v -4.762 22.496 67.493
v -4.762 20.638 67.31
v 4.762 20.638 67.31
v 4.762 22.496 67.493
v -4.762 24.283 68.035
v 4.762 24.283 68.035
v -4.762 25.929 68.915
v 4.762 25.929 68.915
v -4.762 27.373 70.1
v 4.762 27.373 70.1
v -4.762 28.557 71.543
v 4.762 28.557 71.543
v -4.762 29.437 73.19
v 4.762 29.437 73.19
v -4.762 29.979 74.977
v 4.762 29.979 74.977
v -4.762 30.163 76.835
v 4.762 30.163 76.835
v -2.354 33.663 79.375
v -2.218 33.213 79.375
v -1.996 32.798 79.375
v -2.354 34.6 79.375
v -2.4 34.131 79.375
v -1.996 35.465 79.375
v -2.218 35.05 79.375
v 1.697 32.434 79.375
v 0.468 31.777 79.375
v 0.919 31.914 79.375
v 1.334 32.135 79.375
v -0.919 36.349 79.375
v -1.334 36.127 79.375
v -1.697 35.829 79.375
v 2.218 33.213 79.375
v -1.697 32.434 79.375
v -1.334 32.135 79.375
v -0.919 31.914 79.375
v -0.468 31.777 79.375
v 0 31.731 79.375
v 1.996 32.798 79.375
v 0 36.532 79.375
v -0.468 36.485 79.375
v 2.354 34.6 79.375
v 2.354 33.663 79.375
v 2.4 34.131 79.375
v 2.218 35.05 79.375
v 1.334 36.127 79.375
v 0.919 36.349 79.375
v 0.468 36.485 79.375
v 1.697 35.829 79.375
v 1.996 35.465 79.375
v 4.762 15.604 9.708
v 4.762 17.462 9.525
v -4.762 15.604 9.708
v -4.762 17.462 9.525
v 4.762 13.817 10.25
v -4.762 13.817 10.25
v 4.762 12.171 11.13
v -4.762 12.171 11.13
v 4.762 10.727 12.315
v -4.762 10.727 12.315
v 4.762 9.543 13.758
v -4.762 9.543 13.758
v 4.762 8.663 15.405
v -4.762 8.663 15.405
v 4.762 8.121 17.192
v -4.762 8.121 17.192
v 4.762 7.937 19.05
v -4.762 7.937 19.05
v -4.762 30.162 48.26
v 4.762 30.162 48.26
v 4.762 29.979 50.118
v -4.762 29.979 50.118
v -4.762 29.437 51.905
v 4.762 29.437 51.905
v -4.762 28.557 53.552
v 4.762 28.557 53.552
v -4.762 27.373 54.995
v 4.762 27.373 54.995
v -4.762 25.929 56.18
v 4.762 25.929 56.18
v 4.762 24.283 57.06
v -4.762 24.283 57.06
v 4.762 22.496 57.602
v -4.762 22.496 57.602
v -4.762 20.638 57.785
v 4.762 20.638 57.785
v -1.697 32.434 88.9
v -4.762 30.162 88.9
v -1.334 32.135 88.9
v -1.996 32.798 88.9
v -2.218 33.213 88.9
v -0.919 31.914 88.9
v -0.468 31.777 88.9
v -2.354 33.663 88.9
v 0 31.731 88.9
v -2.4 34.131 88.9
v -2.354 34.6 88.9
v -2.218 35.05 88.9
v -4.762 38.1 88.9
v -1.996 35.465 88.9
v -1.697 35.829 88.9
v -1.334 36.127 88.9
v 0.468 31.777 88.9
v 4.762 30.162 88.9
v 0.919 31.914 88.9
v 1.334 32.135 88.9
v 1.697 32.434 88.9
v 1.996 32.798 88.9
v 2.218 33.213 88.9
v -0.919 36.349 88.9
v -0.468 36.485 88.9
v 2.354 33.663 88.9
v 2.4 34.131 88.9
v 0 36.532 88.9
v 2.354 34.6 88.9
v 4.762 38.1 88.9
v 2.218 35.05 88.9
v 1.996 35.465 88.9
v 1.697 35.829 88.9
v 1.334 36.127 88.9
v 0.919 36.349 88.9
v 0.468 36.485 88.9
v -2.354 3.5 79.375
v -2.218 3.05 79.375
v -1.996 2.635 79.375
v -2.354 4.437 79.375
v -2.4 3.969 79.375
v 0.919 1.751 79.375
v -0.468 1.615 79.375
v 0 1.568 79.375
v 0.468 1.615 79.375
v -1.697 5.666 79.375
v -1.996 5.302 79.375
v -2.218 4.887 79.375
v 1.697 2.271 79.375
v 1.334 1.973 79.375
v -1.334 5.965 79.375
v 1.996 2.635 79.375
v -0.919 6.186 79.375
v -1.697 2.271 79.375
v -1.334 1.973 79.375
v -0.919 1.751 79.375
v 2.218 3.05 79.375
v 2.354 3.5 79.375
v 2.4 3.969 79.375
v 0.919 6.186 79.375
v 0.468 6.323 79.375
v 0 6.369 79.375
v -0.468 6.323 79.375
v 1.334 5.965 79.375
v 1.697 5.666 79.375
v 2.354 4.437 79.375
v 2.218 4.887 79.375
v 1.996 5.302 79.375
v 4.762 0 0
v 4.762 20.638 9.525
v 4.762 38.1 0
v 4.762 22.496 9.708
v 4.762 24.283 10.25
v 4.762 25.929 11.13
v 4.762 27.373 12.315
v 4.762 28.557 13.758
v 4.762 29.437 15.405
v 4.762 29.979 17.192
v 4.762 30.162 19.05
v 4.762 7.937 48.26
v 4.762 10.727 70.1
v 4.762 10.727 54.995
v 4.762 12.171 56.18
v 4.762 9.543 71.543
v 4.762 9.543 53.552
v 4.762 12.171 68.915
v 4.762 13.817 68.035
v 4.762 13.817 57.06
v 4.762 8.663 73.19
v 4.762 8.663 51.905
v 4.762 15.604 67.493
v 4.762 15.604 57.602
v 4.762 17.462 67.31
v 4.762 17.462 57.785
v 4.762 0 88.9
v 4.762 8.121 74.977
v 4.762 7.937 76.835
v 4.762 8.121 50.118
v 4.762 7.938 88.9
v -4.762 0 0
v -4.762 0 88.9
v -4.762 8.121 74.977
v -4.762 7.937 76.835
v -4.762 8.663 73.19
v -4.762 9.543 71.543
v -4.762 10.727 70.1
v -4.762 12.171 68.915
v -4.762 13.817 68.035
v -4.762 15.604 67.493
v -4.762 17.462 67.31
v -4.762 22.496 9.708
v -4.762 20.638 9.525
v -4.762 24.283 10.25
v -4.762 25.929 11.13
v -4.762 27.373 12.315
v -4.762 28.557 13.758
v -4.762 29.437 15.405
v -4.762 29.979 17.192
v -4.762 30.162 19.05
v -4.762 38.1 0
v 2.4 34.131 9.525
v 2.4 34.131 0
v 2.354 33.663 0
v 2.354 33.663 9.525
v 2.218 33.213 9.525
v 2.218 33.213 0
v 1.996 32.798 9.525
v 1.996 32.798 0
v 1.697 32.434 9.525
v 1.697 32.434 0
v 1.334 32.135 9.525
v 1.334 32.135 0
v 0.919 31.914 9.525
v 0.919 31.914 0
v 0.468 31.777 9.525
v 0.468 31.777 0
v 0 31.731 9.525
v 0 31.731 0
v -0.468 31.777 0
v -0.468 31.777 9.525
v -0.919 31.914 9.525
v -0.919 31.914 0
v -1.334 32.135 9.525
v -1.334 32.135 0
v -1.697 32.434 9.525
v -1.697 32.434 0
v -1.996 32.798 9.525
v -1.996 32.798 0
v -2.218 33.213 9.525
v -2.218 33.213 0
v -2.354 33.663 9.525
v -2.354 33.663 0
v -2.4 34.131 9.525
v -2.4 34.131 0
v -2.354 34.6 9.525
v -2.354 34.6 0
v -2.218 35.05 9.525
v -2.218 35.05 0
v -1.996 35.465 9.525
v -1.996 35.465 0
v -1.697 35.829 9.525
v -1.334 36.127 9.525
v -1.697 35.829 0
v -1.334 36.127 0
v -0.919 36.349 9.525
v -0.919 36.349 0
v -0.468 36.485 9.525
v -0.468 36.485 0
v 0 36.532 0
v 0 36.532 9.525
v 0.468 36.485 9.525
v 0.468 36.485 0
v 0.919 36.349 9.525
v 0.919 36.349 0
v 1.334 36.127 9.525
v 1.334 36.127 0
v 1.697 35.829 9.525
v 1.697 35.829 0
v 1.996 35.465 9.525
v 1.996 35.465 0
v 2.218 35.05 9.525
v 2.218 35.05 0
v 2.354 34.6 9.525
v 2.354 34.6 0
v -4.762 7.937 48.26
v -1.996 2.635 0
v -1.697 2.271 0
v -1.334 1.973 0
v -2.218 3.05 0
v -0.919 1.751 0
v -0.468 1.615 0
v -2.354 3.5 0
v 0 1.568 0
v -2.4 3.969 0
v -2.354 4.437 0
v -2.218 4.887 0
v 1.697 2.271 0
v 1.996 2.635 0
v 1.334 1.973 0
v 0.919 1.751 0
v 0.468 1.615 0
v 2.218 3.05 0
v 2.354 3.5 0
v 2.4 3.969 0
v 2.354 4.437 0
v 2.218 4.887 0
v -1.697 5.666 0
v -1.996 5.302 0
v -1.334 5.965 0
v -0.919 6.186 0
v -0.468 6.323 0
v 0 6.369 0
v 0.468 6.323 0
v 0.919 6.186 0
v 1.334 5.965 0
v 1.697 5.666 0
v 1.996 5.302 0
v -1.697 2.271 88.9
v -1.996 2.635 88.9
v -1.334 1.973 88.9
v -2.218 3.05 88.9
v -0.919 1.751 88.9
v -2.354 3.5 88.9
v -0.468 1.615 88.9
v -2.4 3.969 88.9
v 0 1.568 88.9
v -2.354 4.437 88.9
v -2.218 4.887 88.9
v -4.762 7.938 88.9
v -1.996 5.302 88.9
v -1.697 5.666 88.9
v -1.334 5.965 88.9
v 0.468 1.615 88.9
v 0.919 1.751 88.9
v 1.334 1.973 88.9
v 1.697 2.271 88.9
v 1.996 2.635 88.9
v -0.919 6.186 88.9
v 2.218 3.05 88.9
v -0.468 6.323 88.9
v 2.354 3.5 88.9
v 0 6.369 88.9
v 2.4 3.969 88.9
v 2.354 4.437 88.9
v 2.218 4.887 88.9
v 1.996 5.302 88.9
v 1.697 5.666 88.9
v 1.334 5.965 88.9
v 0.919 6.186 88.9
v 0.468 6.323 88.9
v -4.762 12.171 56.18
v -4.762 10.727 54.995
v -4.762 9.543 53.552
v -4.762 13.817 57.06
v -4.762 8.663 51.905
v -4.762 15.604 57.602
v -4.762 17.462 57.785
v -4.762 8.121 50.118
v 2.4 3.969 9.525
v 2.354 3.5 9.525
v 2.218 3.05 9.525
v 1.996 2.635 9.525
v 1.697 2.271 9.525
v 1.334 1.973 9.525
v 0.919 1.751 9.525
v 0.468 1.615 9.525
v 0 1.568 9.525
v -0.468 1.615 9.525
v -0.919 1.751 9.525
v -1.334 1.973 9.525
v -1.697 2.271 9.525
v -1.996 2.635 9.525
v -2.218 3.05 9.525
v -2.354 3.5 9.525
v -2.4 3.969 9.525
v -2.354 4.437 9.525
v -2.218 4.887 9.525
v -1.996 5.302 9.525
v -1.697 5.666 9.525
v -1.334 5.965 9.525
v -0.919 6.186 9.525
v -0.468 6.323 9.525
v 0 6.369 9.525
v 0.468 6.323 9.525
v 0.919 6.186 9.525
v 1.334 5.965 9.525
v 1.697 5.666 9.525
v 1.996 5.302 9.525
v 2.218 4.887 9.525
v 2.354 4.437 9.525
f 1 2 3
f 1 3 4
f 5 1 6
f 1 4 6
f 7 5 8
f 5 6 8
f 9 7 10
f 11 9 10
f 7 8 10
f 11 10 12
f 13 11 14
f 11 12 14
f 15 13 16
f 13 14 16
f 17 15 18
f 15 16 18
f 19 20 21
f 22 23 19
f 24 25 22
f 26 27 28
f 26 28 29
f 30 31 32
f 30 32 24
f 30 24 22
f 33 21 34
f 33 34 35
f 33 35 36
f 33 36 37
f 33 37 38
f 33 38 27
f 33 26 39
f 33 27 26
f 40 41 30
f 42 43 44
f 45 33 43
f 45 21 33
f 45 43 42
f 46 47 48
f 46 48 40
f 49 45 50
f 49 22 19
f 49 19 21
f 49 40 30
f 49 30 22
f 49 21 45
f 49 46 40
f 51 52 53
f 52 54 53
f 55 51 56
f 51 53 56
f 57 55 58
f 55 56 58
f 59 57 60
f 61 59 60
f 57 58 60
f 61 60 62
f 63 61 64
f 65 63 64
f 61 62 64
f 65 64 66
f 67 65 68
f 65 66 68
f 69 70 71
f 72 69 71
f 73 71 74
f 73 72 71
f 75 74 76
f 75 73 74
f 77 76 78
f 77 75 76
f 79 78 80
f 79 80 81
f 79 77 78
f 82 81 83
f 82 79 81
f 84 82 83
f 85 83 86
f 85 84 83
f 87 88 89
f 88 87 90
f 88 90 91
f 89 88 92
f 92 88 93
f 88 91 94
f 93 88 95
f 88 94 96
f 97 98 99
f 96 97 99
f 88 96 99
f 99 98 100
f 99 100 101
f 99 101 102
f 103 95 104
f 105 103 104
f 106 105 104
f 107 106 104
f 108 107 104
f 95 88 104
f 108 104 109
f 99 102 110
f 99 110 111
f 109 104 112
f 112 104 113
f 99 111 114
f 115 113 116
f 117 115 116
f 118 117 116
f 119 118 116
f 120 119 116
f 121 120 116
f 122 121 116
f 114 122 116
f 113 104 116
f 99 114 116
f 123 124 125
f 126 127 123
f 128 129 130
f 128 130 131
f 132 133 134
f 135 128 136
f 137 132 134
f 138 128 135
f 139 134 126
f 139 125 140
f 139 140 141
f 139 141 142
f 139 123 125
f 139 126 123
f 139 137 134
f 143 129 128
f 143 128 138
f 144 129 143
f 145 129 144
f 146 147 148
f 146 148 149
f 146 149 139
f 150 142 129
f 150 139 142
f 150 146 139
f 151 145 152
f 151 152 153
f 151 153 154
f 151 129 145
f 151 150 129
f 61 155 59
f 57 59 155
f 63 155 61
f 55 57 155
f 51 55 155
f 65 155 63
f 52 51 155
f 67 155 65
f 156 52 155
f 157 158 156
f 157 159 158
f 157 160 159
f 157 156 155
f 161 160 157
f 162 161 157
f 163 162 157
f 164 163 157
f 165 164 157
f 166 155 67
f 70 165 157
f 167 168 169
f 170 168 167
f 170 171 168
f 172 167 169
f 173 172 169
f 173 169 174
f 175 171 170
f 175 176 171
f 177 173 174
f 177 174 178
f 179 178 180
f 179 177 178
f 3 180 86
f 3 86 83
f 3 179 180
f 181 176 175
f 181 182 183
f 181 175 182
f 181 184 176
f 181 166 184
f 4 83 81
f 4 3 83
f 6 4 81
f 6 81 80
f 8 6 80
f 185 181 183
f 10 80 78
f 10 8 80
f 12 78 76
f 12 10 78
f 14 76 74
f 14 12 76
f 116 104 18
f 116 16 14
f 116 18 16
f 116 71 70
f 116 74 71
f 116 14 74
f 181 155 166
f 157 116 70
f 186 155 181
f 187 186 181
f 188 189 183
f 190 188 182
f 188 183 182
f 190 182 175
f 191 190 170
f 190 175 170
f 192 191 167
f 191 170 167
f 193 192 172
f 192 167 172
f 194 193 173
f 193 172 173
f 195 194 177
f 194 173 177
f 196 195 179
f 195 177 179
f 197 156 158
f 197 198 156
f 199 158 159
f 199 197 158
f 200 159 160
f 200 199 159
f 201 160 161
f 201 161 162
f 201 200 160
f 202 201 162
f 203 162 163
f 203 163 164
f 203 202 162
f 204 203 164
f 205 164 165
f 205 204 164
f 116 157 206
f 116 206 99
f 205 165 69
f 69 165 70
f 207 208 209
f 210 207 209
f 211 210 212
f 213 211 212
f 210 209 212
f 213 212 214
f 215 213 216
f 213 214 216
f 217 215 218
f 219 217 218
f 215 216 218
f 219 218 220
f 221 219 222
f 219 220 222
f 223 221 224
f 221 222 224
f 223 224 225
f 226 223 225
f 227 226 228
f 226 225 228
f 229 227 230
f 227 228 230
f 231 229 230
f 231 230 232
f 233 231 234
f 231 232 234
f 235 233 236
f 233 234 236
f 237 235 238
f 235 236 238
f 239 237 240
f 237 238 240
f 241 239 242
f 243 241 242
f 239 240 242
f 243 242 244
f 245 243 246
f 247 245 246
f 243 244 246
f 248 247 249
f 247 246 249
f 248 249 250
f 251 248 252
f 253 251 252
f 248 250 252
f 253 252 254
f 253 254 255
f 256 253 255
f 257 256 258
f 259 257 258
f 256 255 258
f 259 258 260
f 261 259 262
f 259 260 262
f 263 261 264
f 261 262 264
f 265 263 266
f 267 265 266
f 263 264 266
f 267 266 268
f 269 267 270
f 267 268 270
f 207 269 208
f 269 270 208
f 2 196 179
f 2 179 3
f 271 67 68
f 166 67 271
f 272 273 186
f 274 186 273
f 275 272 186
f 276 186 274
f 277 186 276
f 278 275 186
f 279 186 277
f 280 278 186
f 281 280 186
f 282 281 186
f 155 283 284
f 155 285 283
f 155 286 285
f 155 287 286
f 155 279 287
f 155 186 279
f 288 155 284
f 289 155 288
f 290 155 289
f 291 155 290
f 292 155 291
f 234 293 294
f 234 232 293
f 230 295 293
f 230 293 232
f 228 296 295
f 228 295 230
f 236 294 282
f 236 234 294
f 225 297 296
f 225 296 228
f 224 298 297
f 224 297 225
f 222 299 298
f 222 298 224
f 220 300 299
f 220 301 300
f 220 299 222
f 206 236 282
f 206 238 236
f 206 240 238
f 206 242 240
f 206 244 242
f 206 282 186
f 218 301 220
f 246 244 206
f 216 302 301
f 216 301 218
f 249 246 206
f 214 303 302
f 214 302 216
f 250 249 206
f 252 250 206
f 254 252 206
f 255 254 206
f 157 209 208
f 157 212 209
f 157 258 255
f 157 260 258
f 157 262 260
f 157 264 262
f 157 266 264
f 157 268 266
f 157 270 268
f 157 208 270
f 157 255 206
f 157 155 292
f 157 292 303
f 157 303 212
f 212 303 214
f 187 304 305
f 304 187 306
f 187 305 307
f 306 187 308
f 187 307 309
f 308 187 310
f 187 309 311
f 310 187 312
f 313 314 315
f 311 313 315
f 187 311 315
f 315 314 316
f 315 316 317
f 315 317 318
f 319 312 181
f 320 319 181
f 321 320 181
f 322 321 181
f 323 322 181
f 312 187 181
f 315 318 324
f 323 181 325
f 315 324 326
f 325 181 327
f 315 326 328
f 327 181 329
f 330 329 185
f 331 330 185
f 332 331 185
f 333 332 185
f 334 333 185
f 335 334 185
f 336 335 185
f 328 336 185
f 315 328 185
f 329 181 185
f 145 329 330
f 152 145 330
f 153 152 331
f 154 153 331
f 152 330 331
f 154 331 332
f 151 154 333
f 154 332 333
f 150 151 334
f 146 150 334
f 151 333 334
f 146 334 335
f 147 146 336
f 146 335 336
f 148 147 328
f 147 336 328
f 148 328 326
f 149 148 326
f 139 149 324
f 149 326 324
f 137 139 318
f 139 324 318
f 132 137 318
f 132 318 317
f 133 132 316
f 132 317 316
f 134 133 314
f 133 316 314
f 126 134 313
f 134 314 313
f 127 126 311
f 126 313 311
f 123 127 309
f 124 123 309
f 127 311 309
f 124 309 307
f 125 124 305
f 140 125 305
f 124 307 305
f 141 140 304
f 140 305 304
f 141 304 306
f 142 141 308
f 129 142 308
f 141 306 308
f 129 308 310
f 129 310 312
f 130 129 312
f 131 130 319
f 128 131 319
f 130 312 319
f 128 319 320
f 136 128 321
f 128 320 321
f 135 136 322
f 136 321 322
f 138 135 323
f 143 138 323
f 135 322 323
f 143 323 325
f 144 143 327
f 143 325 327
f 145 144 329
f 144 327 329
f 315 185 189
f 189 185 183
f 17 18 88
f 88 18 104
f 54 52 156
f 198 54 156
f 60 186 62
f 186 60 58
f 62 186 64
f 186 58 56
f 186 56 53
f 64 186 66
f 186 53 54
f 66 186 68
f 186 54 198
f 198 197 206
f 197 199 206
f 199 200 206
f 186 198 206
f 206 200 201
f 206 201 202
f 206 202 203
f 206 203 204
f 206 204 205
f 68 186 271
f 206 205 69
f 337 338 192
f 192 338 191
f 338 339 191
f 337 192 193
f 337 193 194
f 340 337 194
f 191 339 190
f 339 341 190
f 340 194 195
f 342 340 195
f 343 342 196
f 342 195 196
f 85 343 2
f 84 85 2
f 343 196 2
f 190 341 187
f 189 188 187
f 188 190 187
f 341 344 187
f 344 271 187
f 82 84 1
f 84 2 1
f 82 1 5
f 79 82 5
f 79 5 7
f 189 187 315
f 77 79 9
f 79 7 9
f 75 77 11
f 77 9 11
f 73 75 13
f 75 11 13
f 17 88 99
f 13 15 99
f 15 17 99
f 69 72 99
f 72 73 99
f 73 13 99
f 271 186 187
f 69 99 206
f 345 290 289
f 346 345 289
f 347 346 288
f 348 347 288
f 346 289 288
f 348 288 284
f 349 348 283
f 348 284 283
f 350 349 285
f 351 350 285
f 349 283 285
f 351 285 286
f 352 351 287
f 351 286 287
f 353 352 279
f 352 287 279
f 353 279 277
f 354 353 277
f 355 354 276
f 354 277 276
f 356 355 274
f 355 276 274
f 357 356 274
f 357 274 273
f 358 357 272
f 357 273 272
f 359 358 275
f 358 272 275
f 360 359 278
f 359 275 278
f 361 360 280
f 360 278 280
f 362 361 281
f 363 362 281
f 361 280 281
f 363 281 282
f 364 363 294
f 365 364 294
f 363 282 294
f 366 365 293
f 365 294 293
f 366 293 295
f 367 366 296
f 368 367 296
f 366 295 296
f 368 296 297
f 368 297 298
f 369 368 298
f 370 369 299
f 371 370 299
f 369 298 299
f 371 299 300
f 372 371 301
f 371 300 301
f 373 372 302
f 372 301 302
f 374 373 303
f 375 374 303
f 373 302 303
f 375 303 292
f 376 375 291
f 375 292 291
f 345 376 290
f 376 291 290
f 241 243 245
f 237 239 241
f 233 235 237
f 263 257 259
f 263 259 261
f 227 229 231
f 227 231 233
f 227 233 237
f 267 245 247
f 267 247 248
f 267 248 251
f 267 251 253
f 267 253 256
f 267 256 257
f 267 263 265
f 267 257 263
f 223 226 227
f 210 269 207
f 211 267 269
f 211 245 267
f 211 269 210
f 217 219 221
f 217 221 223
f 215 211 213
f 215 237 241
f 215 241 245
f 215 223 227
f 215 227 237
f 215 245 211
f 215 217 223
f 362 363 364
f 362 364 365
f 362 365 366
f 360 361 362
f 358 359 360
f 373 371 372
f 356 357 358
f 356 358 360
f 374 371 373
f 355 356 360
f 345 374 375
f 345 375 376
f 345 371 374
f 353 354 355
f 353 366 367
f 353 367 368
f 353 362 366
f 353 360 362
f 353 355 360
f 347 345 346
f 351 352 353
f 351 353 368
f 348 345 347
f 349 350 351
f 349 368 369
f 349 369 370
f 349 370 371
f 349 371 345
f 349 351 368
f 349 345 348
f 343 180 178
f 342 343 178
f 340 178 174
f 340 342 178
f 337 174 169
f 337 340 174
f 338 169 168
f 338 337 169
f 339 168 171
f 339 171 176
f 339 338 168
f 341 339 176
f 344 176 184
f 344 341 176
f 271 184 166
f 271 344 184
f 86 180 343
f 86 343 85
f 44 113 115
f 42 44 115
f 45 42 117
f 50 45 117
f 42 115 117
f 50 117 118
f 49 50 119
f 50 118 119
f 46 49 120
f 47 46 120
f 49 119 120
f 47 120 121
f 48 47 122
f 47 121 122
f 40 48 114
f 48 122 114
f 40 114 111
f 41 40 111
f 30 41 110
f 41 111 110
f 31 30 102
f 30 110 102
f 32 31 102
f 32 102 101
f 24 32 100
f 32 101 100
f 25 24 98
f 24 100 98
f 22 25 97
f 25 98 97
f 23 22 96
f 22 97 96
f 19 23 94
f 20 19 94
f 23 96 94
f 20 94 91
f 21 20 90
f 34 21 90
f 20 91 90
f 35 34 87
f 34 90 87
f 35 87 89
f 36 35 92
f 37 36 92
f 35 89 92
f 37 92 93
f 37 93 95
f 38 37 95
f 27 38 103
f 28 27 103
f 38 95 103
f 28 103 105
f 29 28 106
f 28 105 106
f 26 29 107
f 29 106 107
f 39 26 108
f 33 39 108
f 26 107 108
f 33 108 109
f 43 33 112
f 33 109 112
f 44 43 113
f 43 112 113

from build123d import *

# Parameters (mm, degrees)
F0_W     = 38.1
F0_H     = 88.9
F1_DEPTH = 4.7625
F3_DEPTH = 12.7
F4_R     = 2.4003
F5_DEPTH = 9.525
F6_R     = 2.4003
F7_DEPTH = 9.525
F8_W     = 22.225
F8_H     = 48.26
F9_DEPTH = 9.526
F10_R    = 9.525


with BuildPart() as f1:
    # F0 (on Right) → F1 (new body, symmetric)
    with BuildSketch(Plane.YZ):
        with Locations((19.05, 44.45)):
            Rectangle(F0_W, F0_H)
    extrude(amount=F1_DEPTH, both=True)

    # F2 (on face) → F3 (cut, symmetric)
    with BuildSketch(Plane.YZ.offset(4.7625)):
        with BuildLine():
            Line((30.1625, 88.9), (7.9375, 88.9))
            Line((7.9375, 88.9), (7.9375, 76.835))
            ThreePointArc((7.9375, 76.835), (10.7273079092, 70.0998079092), (17.4625, 67.31))
            Line((17.4625, 67.31), (20.6375, 67.31))
            ThreePointArc((20.6375, 67.31), (27.3726920908, 70.0998079092), (30.1625, 76.835))
            Line((30.1625, 76.835), (30.1625, 88.9))
        make_face()
    extrude(amount=F3_DEPTH, both=True, mode=Mode.SUBTRACT)

    # F4 (on face) → F5 (cut)
    with BuildSketch(Plane.XY.offset(88.9)):
        with Locations((0, 3.96875)):
            Circle(F4_R)
        with Locations((0, 34.13125)):
            Circle(F4_R)
    extrude(amount=-F5_DEPTH, mode=Mode.SUBTRACT)

    # F6 (on face) → F7 (cut)
    with BuildSketch(Plane(origin=(0, 0, 0), x_dir=(1, 0, 0), z_dir=(0, 0, -1))):
        with Locations((0, -3.96875)):
            Circle(F6_R)
        with Locations((0, -34.13125)):
            Circle(F6_R)
    extrude(amount=-F7_DEPTH, mode=Mode.SUBTRACT)

    # F8 (on face) → F9 (cut, through all)
    with BuildSketch(Plane.YZ.offset(4.7625)):
        with Locations((19.05, 33.655)):
            Rectangle(F8_W, F8_H)
    extrude(amount=-F9_DEPTH, mode=Mode.SUBTRACT)

    # F10
    f10_edges = [f1.edges().sort_by_distance(p)[0] for p in [
        (0, 7.9375, 57.785),
        (0, 30.1625, 57.785),
        (0, 7.9375, 9.525),
        (0, 30.1625, 9.525),
    ]]
    fillet(f10_edges, radius=F10_R)


solid = f1.part
